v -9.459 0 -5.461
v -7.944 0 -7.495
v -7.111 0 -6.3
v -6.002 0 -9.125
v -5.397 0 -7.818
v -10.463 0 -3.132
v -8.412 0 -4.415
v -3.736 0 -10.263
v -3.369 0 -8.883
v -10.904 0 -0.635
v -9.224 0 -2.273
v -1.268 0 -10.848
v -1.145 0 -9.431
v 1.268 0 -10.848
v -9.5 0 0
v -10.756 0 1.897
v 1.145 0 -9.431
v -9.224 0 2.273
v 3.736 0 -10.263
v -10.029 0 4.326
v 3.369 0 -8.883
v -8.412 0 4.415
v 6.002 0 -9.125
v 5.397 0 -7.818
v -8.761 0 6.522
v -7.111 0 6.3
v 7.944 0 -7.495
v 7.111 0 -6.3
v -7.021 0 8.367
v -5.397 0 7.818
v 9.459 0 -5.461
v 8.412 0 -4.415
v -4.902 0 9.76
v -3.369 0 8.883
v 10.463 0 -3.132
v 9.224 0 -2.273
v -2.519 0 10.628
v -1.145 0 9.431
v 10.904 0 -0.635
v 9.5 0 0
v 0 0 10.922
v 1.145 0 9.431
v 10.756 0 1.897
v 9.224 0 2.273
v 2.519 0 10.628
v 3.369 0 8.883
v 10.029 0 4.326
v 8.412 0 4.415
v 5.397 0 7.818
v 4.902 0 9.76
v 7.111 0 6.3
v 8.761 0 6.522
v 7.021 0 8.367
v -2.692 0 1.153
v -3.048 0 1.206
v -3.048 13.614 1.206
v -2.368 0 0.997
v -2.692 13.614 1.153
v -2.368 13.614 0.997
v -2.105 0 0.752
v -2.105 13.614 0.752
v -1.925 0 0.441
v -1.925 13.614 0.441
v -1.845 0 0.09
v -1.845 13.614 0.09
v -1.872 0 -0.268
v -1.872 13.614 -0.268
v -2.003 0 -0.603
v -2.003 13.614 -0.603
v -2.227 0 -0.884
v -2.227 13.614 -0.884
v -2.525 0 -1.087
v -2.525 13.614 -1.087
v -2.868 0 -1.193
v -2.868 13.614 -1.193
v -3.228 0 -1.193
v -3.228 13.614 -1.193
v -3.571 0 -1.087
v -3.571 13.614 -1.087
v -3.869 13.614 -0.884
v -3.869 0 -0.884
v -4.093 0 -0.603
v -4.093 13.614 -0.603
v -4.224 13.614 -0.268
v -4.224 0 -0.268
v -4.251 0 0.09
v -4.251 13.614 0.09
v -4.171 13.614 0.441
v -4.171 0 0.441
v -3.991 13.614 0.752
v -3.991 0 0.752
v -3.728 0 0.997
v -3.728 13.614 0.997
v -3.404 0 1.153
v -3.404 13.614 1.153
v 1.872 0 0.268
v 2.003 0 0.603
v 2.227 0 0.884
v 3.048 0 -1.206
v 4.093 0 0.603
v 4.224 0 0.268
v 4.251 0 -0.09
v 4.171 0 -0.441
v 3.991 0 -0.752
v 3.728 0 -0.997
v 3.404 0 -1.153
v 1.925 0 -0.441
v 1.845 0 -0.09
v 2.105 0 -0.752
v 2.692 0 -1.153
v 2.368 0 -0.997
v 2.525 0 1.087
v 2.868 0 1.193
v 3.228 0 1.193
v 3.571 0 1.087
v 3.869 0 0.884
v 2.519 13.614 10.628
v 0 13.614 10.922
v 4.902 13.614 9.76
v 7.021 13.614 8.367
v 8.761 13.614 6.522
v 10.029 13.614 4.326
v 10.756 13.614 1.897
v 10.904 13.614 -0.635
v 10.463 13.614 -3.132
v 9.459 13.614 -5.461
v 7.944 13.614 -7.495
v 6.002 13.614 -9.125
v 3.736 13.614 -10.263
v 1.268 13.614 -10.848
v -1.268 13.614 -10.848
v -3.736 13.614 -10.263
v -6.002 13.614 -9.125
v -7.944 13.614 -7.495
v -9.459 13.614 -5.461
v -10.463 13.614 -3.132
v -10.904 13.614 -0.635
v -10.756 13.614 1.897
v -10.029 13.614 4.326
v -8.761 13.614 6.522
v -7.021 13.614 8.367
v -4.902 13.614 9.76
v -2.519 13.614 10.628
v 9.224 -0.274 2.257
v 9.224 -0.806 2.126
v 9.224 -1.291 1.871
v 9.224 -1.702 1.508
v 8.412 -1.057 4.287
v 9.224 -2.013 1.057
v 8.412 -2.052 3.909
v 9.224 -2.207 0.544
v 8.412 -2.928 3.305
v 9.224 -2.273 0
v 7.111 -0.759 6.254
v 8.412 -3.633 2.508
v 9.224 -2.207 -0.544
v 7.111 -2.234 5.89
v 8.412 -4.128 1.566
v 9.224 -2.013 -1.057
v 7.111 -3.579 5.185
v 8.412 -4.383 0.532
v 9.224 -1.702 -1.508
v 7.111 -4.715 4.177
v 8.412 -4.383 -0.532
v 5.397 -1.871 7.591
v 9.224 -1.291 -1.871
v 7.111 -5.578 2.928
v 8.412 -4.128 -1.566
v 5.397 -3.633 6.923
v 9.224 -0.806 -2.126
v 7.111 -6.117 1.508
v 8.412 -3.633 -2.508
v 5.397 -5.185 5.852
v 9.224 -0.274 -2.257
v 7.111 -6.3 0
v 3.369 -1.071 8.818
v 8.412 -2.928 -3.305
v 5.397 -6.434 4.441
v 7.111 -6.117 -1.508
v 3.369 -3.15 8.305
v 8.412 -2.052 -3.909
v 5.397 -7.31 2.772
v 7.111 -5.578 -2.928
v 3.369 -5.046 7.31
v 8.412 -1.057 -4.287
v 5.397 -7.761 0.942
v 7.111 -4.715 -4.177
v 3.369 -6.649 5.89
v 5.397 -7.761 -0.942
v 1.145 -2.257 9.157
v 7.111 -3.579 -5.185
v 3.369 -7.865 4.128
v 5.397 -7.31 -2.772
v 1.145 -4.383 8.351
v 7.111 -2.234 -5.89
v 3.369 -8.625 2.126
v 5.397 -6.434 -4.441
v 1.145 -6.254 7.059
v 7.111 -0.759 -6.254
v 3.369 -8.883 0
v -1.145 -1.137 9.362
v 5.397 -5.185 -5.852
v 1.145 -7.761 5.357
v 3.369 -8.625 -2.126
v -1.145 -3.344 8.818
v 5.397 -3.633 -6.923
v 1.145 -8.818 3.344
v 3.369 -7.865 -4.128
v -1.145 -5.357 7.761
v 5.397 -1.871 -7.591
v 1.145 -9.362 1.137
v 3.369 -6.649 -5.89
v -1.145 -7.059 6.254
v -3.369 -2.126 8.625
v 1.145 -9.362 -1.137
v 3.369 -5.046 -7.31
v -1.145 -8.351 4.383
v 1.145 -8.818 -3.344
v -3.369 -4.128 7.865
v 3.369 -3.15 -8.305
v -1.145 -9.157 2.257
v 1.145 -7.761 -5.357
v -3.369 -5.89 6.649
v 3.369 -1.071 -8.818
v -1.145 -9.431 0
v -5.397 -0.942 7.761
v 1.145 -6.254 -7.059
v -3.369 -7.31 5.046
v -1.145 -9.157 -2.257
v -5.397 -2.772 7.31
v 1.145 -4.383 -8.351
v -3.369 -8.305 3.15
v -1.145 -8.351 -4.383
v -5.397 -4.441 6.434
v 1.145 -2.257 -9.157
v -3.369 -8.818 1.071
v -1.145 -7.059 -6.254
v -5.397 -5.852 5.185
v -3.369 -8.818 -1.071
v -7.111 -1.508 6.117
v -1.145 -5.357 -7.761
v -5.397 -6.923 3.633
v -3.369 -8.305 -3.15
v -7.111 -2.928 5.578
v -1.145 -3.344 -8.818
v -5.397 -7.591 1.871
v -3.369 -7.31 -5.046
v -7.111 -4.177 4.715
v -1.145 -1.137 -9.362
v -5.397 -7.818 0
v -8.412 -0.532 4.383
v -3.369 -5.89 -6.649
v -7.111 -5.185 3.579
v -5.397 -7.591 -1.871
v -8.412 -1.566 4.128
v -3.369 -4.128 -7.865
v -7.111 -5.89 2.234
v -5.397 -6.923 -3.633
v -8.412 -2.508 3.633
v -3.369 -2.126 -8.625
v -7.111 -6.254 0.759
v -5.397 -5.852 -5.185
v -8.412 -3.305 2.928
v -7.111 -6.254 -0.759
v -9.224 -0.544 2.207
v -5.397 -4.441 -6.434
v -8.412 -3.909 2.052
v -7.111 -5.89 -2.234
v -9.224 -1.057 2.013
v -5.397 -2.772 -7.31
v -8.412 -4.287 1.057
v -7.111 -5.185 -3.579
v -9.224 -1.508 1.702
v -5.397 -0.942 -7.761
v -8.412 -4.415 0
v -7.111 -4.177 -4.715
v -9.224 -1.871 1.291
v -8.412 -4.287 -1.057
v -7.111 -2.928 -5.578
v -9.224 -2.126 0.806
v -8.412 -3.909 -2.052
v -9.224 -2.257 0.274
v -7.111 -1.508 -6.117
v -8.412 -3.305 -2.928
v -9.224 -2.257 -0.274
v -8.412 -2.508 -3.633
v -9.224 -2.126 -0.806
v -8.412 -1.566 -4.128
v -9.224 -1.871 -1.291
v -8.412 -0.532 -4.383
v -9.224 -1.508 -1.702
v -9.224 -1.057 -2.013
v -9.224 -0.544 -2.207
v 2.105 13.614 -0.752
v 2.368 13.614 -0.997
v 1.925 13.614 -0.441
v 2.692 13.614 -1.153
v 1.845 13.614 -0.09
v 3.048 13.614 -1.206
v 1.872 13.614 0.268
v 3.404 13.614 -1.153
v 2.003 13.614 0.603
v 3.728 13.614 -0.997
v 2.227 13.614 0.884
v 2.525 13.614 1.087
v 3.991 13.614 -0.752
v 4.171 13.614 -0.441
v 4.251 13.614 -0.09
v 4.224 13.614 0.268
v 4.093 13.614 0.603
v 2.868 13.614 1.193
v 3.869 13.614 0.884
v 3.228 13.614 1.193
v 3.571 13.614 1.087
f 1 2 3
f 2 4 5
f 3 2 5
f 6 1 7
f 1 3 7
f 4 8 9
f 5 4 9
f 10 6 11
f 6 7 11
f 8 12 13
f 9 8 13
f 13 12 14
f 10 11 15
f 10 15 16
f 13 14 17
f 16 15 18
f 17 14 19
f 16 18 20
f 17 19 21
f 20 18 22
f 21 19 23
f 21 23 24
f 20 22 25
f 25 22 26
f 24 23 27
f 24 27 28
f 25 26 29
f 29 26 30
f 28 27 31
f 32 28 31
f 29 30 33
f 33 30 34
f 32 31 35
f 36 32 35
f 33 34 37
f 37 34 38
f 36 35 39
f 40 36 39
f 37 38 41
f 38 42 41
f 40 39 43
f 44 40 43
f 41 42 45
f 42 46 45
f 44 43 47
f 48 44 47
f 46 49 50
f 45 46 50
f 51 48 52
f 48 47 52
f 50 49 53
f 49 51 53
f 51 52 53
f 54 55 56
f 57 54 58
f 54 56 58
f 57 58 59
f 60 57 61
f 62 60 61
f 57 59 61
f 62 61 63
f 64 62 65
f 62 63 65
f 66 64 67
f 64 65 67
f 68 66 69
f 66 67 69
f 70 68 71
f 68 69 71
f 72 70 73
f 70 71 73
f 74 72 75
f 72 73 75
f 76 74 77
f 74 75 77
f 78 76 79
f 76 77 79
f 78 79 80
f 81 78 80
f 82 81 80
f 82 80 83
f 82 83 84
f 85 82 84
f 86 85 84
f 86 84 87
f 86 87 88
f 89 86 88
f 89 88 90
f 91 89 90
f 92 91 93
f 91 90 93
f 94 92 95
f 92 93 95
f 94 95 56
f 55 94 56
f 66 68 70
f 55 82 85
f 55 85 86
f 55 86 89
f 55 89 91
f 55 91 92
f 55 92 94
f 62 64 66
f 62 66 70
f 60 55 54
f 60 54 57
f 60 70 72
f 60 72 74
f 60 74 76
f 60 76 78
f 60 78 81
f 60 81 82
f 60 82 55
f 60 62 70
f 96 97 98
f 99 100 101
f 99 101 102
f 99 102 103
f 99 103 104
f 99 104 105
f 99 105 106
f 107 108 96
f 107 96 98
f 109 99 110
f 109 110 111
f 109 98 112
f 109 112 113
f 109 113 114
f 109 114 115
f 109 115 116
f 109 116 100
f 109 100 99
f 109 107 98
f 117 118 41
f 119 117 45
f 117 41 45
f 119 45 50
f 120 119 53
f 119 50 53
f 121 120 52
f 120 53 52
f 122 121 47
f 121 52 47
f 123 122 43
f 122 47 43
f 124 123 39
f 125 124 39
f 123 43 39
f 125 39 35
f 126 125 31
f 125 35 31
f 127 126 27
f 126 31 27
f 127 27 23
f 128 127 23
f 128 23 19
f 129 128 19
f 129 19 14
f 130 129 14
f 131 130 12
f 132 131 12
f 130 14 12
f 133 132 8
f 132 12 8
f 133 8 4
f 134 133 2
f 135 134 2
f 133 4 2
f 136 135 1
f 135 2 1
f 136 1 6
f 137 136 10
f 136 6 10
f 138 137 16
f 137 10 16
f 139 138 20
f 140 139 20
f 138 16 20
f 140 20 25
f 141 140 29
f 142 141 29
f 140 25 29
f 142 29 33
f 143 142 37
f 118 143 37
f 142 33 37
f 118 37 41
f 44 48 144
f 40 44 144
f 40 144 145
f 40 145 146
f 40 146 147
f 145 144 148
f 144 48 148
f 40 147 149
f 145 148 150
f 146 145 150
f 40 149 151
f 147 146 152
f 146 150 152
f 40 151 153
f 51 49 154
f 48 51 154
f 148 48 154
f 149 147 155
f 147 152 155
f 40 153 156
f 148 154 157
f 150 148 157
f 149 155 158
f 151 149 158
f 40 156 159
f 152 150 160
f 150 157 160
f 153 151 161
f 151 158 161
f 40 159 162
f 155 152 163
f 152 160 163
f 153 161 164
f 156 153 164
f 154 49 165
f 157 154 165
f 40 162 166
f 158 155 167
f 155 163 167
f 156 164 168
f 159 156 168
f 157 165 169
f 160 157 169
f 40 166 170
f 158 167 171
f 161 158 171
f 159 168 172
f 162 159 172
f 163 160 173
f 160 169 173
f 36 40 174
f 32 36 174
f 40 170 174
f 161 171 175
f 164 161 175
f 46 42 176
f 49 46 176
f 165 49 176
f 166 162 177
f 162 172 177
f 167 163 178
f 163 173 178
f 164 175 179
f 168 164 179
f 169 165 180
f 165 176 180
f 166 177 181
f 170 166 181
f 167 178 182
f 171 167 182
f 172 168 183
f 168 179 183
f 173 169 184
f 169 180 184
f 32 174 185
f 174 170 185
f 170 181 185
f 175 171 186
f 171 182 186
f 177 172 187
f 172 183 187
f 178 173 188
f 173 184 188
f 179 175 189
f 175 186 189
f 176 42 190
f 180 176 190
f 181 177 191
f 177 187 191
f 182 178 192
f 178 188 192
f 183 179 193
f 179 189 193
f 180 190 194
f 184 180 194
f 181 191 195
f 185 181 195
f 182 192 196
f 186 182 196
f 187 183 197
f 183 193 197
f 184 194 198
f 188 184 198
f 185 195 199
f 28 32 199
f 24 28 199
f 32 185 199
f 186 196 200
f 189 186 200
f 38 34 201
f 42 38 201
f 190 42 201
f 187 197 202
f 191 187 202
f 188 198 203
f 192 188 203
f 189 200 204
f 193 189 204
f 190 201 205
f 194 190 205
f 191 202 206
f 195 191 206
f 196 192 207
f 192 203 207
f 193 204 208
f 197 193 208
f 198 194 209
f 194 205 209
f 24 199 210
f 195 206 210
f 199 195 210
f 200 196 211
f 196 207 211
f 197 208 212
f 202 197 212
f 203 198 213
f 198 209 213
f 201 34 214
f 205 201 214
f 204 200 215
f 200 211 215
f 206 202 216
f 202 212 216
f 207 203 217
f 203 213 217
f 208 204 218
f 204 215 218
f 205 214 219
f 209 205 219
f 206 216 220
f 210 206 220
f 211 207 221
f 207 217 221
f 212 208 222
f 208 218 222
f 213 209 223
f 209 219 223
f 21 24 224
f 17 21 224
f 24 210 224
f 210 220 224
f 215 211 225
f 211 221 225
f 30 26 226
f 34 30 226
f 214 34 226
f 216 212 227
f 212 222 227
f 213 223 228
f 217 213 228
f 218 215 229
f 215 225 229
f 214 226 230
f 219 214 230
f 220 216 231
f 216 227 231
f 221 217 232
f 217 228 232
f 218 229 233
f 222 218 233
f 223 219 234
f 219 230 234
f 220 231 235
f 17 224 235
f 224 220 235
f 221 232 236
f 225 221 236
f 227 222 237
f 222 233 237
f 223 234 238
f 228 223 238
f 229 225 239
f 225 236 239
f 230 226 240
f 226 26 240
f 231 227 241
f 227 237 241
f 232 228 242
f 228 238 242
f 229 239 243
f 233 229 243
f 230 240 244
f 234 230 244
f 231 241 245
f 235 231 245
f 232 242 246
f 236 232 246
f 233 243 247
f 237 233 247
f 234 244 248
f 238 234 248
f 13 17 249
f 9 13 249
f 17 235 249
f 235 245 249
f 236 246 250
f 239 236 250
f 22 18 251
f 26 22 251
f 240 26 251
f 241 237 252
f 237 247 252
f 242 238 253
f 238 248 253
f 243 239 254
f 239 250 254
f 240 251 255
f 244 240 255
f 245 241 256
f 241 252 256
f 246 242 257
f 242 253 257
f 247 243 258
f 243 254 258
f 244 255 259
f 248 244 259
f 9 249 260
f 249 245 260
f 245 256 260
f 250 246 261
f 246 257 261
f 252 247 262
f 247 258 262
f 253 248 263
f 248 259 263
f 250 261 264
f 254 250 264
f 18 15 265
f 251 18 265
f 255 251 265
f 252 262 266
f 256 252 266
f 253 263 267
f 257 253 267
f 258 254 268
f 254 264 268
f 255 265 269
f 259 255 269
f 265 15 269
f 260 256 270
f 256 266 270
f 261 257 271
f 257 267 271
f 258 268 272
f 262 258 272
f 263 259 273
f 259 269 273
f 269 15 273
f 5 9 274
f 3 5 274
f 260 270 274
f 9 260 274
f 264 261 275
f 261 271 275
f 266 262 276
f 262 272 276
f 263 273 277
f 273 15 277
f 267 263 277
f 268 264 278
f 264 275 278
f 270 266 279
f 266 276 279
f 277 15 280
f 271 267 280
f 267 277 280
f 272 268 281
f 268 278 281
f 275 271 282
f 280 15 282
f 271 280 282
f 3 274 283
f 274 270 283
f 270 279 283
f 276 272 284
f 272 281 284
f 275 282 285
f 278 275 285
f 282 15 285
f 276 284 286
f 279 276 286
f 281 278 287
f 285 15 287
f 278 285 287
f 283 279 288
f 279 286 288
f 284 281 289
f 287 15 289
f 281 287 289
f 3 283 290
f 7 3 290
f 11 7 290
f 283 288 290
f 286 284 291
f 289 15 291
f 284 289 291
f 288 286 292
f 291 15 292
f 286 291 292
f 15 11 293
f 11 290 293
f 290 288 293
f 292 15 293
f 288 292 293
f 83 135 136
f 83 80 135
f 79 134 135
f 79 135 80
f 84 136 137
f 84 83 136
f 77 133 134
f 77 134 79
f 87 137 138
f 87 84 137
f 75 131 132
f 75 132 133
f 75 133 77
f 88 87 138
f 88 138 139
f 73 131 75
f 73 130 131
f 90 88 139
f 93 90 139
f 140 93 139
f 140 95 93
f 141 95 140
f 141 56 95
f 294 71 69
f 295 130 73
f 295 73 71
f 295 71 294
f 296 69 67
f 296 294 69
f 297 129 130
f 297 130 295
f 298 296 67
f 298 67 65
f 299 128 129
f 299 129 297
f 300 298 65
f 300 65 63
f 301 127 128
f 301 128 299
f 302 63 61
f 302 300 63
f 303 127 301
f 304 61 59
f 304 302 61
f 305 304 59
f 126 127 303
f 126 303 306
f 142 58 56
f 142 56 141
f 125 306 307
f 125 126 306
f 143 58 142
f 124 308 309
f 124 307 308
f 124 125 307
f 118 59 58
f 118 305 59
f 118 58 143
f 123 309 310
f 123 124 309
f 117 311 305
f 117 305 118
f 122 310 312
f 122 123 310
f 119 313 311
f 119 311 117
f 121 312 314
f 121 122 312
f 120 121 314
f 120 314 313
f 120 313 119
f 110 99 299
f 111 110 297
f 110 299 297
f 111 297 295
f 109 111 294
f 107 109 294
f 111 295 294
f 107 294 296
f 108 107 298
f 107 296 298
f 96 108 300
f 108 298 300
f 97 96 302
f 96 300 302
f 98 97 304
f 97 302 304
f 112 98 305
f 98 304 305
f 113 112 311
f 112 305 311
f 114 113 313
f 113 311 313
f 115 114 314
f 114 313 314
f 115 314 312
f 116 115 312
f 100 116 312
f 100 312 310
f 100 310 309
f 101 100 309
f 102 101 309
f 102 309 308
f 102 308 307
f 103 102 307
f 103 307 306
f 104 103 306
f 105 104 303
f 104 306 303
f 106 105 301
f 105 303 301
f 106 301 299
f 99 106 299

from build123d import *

# Parameters (mm, degrees)
CROQUIS7_R              = 10.922
SALIENTE_EXTRUIR2_DEPTH = 13.614
CROQUIS8_R              = 1.2065
CORTAR_EXTRUIR3_DEPTH   = 13.614


with BuildPart() as part:
    # Croquis1 → Revolución1 (revolve)
    with BuildSketch(Plane.XY):
        with BuildLine():
            Line((-9.5, 0), (9.5, 0))
            ThreePointArc((9.5, 0), (0, 9.5), (-9.5, 0))
        make_face()
    revolve(axis=Axis((-9.5, 0, 0), (1, 0, 0)))

    # Croquis7 → Saliente-Extruir2 (add)
    with BuildSketch(Plane(origin=(0, 0, 0), x_dir=(1, 0, 0), z_dir=(0, 1, 0))):
        with Locations(Location((0, 0, 0), (0, 0, 270))):
            Circle(CROQUIS7_R)
    extrude(amount=SALIENTE_EXTRUIR2_DEPTH)

    # Croquis8 → Cortar-Extruir3 (cut)
    with BuildSketch(Plane(origin=(0, 13.614, 0), x_dir=(1, 0, 0), z_dir=(0, 1, 0))):
        with Locations(Location((-3.048, 0, 0), (0, 0, 270))):
            Circle(CROQUIS8_R)
        with Locations(Location((3.048, 0, 0), (0, 0, 90))):
            Circle(CROQUIS8_R)
    extrude(amount=-CORTAR_EXTRUIR3_DEPTH, mode=Mode.SUBTRACT)


solid = part.part
